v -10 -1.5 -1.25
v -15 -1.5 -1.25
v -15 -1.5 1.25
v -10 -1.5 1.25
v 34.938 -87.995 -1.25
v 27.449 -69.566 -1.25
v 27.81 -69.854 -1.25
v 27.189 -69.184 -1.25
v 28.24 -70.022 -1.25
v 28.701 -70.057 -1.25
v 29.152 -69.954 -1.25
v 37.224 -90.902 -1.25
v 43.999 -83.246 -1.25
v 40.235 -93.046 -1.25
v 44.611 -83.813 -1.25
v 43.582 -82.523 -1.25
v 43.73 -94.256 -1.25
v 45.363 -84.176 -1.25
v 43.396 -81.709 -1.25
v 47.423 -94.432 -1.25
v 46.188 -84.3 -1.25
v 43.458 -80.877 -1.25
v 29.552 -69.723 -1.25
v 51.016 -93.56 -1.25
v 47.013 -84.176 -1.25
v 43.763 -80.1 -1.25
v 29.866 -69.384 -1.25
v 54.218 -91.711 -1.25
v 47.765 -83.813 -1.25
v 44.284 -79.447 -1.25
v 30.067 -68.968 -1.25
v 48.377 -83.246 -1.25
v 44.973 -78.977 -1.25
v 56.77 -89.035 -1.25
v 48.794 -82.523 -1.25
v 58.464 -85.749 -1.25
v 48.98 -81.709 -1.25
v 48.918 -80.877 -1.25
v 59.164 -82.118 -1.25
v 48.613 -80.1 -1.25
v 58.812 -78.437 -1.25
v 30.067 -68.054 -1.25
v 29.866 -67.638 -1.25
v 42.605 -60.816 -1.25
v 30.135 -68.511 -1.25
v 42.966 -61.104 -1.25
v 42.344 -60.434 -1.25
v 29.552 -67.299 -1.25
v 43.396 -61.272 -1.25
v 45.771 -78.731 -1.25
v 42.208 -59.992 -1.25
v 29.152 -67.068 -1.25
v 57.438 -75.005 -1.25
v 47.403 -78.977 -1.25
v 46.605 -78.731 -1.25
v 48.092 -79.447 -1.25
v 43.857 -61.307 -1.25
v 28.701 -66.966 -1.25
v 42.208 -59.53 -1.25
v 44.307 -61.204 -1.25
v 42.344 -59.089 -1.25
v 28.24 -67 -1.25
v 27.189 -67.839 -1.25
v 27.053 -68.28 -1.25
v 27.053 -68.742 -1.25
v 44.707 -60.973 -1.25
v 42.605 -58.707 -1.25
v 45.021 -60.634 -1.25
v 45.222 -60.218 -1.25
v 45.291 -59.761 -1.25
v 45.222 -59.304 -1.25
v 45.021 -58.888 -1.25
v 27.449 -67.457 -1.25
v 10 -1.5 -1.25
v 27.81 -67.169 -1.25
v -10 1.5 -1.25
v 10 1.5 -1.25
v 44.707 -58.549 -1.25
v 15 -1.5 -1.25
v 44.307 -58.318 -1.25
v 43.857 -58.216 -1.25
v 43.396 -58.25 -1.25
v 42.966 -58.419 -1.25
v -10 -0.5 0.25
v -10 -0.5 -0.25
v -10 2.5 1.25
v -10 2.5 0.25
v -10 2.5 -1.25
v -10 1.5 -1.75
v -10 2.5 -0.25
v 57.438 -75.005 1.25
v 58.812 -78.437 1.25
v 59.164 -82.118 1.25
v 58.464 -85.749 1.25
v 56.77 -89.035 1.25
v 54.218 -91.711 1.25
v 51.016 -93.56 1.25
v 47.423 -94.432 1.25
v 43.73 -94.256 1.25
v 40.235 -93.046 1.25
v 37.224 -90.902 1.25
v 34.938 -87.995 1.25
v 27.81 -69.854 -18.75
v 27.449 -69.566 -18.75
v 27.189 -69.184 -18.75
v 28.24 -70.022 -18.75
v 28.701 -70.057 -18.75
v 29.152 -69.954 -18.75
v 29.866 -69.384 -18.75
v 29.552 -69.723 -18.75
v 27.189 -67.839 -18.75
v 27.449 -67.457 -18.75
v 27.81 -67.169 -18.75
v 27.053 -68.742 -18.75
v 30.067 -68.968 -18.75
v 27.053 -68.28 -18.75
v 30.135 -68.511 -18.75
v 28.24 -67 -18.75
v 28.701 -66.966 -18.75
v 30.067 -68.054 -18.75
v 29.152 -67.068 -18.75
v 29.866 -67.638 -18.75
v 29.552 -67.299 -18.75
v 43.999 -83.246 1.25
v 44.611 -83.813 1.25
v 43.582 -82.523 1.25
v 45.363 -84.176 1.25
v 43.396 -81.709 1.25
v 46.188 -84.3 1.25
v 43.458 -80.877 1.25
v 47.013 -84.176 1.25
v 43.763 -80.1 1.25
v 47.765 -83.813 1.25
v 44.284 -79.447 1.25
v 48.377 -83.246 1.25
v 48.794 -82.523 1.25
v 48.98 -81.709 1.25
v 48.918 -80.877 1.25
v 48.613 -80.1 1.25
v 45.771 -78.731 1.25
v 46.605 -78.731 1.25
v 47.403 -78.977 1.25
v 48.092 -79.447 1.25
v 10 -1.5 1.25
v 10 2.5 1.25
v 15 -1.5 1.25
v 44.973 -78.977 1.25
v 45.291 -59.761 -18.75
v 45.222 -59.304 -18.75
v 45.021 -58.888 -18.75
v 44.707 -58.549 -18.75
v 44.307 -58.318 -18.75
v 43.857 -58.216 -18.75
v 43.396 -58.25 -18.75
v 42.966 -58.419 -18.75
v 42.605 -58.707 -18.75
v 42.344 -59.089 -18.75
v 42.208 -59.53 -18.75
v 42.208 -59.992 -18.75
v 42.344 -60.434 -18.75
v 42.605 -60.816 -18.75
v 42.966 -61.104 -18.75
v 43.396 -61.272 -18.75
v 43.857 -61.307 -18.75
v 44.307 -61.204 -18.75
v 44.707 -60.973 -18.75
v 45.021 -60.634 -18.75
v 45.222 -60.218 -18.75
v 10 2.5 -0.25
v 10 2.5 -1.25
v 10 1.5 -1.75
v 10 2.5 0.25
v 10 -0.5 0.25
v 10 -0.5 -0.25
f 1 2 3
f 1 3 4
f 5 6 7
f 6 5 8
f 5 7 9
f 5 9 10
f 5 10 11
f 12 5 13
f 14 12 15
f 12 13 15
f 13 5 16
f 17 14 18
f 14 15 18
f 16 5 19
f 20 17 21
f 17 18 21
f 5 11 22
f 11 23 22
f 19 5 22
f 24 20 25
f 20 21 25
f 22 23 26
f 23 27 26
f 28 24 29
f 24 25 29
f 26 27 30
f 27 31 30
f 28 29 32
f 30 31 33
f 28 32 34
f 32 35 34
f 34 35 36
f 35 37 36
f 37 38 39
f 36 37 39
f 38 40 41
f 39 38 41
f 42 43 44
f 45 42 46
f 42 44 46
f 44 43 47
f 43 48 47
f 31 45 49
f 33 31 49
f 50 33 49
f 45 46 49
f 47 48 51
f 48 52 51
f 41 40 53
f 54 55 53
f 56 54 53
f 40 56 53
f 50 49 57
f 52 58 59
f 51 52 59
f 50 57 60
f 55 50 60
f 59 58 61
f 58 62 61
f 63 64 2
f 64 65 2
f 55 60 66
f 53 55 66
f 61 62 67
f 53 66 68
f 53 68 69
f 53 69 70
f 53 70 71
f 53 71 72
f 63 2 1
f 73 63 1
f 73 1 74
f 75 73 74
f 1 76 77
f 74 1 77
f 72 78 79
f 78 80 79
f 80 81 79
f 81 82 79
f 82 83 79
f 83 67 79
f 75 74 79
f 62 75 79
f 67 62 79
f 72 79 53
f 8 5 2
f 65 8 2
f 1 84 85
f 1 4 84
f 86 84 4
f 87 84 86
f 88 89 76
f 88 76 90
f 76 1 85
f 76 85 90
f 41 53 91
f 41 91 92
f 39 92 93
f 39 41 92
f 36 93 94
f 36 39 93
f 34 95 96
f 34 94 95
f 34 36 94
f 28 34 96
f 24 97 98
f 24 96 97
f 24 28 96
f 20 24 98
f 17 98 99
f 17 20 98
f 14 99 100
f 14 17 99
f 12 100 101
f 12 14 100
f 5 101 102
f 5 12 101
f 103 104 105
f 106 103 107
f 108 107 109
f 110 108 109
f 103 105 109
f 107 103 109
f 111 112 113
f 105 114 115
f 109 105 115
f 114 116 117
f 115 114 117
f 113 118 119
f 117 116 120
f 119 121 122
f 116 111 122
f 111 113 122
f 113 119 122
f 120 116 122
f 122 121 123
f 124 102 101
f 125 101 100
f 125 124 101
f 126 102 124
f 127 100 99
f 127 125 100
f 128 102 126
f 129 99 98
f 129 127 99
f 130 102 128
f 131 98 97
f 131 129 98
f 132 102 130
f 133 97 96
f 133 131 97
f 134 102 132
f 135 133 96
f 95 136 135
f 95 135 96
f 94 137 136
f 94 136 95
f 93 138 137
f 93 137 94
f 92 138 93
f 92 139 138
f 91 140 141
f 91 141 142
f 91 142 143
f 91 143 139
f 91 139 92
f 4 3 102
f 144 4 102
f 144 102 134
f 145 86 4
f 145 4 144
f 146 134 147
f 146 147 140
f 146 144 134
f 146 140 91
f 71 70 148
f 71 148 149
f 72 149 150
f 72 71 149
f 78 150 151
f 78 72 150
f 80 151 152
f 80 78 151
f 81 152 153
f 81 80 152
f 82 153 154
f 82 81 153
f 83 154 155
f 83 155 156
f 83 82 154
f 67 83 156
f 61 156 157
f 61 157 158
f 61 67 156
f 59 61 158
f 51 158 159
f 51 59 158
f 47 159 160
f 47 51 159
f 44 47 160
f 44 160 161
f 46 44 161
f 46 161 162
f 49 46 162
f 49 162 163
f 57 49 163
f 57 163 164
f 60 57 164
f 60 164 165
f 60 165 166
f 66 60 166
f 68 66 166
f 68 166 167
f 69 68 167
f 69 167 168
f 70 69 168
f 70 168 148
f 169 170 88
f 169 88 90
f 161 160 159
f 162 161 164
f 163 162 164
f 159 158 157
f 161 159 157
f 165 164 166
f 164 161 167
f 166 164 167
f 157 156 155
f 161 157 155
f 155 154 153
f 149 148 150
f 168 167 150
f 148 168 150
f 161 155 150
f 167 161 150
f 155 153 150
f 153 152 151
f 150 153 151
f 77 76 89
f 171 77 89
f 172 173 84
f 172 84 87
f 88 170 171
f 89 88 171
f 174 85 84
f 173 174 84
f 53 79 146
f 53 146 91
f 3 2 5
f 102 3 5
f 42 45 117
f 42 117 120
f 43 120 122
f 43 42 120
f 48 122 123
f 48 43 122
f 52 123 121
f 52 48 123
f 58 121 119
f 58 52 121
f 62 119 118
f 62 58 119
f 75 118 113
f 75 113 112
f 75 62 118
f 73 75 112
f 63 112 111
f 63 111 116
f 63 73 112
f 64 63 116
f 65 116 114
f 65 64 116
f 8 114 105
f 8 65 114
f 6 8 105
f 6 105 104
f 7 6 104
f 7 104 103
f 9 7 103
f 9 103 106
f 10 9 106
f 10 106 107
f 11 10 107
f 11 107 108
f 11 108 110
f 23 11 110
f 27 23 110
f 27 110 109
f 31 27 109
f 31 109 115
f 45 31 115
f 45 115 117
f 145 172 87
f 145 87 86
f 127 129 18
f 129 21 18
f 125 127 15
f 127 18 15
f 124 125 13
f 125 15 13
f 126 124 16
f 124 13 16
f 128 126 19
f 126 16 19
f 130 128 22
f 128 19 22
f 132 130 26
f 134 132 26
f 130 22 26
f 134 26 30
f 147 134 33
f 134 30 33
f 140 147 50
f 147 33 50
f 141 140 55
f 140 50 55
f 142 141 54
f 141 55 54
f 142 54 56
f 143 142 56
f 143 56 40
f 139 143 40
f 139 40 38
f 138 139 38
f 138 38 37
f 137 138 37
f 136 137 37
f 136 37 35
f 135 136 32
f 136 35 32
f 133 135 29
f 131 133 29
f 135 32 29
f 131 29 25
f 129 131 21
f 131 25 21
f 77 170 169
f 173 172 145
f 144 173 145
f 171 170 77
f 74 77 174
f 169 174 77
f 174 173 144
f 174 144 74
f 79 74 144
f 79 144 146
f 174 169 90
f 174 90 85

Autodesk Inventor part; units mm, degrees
ref_plane "YZ Plane" through (0, 0, 0) normal (1, 0, 0) x (0, 1, 0)
ref_plane "XZ Plane" through (0, 0, 0) normal (0, 1, 0) x (-1, 0, 0)
ref_plane "XY Plane" through (0, 0, 0) normal (0, 0, 1) x (1, 0, 0)
sketch "Sketch1" plane through (0, 0, 0) normal (0, 0, 1) x (1, 0, 0)
  line L0 (-16.8629, 0) -> (19.5362, 0)
  line L1 (0, 12.2153) -> (0, -13.8193)
  line L2 (-10, 1.5) -> (10, 1.5)
  line L3 (10, 1.5) -> (10, -1.5)
  line L4 (10, -1.5) -> (-10, -1.5)
  line L5 (-10, -1.5) -> (-10, 1.5)
  point P0 (0, 0)
  point P1 (0, -1.5)
  point P2 (0, 1.5)
  dimension "d0" = 3
  dimension "d1" = 20
sketch "Sketch3" plane through (0, 0, 0) normal (0, 0, 1) x (1, 0, 0)
  line L0 (0, 4.1951) -> (0, -4.771)
  line L1 (15, -1.5) -> (57.438, -75.0048)
  line L2 (-15, -1.5) -> (34.938, -87.9952)
  line L3 (0, -1.5) -> (34.9904, -62.1052)
  arc A0 (34.938, -87.9952) -> (57.438, -75.0048) centre (46.188, -81.5) ccw
  line L4 (-17.5915, 0) -> (22.0991, 0)
  line L5 (-15, -1.5) -> (15, -1.5)
  point P0 (0, -0.2879)
  dimension "d20" = 30
  dimension "d36" = 3
  dimension "d37" = 80
  dimension "d38" = 12.9904
  dimension "d39" = 124.2104
  dimension "d40" = 44.1981
  dimension "d41" = 8.3903
  dimension "d42" = 0.5758
  dimension "d43" = 3
  dimension "d44" = 35.1831
extrude "Extrusion1" add sketch "Sketch3" along normal mid plane 2.5
sketch "Sketch5" plane through (0, 0, 1.25) normal (0, 0, 1) x (1, 0, 0)
  arc A0 (34.938, -87.9952) -> (57.438, -75.0048) centre (46.188, -81.5) ccw projected
  point P0 (0, 0)
  point P1 (38.391, -42.0144)
hole "Hole1" at (46.188, -81.5, 1.25) direction (0, 0, -1) diameter 5.6 end through all
sketch "Sketch6" plane through (0, 0, 1.25) normal (0, 0, 1) x (1, 0, 0)
  line L0 (21.1799, -20.6847) -> (35.9337, -46.239)
  line L1 (4.4808, -26.761) -> (20.9112, -55.2193)
  line L2 (57.438, -75.0048) -> (15, -1.5) projected
  line L3 (28.5854, -68.5113) -> (43.7408, -59.7613)
  circle A0 centre (43.7408, -59.7613) radius 1.55
  circle A1 centre (28.5854, -68.5113) radius 1.55
  circle A2 centre (46.188, -81.5) radius 2.8 projected
  line L4 (46.188, -81.5) -> (10.4204, -19.5487)
  line L5 (43.7408, -59.7613) -> (46.188, -81.5)
  point P0 (0, 0)
  point P1 (38.391, -42.0144)
  dimension "d25" = 17.5
  dimension "d26" = 3.1
  dimension "d27" = 3.1
  dimension "d32" = 21.876
extrude "Extrusion3" add sketch "Sketch6" against normal blind 20 contours A1 | A0 L5 L3 | L3 L5 A0
extrude "Extrusion4" add sketch "Sketch1" along normal mid plane 2.5
sketch "Sketch7" plane through (10, -1.5, 1.25) normal (1, 0, 0) x (0, 0, -1)
  line L0 (0, 0) -> (0, 3) projected
  line L1 (0, 3) -> (2.5, 3)
  line L2 (2.5, 3) -> (2.5, 4)
  line L3 (2.5, 4) -> (0, 4)
  line L4 (0, 4) -> (0, 3)
  line L5 (2.5, 4) -> (3, 3)
  line L6 (3, 3) -> (2.5, 3)
  point P0 (1.25, 1.5)
  dimension "d45" = 1
  dimension "d46" = 0.5
extrude "Extrusion5" add sketch "Sketch7" against normal up to surface (20 mm away)
sketch "Sketch8" plane through (10, -1.5, 1.25) normal (1, 0, 0) x (0, 0, -1)
  line L0 (2.5, 4) -> (0, 4) projected
  line L1 (1.25, 4) -> (1.25, -0.4591)
  line L2 (1, 4.1974) -> (1.5, 4.1974)
  line L3 (1.5, 4.1974) -> (1.5, 1)
  line L4 (1.5, 1) -> (1, 1)
  line L5 (1, 1) -> (1, 4.1974)
  line L6 (2.5, 0) -> (0, 0) projected
  point P0 (1.25, 1.5)
  dimension "d49" = 1
  dimension "d50" = 0.5
extrude "Extrusion6" cut sketch "Sketch8" against normal up to surface (20 mm away)
properties part number "bacak"
